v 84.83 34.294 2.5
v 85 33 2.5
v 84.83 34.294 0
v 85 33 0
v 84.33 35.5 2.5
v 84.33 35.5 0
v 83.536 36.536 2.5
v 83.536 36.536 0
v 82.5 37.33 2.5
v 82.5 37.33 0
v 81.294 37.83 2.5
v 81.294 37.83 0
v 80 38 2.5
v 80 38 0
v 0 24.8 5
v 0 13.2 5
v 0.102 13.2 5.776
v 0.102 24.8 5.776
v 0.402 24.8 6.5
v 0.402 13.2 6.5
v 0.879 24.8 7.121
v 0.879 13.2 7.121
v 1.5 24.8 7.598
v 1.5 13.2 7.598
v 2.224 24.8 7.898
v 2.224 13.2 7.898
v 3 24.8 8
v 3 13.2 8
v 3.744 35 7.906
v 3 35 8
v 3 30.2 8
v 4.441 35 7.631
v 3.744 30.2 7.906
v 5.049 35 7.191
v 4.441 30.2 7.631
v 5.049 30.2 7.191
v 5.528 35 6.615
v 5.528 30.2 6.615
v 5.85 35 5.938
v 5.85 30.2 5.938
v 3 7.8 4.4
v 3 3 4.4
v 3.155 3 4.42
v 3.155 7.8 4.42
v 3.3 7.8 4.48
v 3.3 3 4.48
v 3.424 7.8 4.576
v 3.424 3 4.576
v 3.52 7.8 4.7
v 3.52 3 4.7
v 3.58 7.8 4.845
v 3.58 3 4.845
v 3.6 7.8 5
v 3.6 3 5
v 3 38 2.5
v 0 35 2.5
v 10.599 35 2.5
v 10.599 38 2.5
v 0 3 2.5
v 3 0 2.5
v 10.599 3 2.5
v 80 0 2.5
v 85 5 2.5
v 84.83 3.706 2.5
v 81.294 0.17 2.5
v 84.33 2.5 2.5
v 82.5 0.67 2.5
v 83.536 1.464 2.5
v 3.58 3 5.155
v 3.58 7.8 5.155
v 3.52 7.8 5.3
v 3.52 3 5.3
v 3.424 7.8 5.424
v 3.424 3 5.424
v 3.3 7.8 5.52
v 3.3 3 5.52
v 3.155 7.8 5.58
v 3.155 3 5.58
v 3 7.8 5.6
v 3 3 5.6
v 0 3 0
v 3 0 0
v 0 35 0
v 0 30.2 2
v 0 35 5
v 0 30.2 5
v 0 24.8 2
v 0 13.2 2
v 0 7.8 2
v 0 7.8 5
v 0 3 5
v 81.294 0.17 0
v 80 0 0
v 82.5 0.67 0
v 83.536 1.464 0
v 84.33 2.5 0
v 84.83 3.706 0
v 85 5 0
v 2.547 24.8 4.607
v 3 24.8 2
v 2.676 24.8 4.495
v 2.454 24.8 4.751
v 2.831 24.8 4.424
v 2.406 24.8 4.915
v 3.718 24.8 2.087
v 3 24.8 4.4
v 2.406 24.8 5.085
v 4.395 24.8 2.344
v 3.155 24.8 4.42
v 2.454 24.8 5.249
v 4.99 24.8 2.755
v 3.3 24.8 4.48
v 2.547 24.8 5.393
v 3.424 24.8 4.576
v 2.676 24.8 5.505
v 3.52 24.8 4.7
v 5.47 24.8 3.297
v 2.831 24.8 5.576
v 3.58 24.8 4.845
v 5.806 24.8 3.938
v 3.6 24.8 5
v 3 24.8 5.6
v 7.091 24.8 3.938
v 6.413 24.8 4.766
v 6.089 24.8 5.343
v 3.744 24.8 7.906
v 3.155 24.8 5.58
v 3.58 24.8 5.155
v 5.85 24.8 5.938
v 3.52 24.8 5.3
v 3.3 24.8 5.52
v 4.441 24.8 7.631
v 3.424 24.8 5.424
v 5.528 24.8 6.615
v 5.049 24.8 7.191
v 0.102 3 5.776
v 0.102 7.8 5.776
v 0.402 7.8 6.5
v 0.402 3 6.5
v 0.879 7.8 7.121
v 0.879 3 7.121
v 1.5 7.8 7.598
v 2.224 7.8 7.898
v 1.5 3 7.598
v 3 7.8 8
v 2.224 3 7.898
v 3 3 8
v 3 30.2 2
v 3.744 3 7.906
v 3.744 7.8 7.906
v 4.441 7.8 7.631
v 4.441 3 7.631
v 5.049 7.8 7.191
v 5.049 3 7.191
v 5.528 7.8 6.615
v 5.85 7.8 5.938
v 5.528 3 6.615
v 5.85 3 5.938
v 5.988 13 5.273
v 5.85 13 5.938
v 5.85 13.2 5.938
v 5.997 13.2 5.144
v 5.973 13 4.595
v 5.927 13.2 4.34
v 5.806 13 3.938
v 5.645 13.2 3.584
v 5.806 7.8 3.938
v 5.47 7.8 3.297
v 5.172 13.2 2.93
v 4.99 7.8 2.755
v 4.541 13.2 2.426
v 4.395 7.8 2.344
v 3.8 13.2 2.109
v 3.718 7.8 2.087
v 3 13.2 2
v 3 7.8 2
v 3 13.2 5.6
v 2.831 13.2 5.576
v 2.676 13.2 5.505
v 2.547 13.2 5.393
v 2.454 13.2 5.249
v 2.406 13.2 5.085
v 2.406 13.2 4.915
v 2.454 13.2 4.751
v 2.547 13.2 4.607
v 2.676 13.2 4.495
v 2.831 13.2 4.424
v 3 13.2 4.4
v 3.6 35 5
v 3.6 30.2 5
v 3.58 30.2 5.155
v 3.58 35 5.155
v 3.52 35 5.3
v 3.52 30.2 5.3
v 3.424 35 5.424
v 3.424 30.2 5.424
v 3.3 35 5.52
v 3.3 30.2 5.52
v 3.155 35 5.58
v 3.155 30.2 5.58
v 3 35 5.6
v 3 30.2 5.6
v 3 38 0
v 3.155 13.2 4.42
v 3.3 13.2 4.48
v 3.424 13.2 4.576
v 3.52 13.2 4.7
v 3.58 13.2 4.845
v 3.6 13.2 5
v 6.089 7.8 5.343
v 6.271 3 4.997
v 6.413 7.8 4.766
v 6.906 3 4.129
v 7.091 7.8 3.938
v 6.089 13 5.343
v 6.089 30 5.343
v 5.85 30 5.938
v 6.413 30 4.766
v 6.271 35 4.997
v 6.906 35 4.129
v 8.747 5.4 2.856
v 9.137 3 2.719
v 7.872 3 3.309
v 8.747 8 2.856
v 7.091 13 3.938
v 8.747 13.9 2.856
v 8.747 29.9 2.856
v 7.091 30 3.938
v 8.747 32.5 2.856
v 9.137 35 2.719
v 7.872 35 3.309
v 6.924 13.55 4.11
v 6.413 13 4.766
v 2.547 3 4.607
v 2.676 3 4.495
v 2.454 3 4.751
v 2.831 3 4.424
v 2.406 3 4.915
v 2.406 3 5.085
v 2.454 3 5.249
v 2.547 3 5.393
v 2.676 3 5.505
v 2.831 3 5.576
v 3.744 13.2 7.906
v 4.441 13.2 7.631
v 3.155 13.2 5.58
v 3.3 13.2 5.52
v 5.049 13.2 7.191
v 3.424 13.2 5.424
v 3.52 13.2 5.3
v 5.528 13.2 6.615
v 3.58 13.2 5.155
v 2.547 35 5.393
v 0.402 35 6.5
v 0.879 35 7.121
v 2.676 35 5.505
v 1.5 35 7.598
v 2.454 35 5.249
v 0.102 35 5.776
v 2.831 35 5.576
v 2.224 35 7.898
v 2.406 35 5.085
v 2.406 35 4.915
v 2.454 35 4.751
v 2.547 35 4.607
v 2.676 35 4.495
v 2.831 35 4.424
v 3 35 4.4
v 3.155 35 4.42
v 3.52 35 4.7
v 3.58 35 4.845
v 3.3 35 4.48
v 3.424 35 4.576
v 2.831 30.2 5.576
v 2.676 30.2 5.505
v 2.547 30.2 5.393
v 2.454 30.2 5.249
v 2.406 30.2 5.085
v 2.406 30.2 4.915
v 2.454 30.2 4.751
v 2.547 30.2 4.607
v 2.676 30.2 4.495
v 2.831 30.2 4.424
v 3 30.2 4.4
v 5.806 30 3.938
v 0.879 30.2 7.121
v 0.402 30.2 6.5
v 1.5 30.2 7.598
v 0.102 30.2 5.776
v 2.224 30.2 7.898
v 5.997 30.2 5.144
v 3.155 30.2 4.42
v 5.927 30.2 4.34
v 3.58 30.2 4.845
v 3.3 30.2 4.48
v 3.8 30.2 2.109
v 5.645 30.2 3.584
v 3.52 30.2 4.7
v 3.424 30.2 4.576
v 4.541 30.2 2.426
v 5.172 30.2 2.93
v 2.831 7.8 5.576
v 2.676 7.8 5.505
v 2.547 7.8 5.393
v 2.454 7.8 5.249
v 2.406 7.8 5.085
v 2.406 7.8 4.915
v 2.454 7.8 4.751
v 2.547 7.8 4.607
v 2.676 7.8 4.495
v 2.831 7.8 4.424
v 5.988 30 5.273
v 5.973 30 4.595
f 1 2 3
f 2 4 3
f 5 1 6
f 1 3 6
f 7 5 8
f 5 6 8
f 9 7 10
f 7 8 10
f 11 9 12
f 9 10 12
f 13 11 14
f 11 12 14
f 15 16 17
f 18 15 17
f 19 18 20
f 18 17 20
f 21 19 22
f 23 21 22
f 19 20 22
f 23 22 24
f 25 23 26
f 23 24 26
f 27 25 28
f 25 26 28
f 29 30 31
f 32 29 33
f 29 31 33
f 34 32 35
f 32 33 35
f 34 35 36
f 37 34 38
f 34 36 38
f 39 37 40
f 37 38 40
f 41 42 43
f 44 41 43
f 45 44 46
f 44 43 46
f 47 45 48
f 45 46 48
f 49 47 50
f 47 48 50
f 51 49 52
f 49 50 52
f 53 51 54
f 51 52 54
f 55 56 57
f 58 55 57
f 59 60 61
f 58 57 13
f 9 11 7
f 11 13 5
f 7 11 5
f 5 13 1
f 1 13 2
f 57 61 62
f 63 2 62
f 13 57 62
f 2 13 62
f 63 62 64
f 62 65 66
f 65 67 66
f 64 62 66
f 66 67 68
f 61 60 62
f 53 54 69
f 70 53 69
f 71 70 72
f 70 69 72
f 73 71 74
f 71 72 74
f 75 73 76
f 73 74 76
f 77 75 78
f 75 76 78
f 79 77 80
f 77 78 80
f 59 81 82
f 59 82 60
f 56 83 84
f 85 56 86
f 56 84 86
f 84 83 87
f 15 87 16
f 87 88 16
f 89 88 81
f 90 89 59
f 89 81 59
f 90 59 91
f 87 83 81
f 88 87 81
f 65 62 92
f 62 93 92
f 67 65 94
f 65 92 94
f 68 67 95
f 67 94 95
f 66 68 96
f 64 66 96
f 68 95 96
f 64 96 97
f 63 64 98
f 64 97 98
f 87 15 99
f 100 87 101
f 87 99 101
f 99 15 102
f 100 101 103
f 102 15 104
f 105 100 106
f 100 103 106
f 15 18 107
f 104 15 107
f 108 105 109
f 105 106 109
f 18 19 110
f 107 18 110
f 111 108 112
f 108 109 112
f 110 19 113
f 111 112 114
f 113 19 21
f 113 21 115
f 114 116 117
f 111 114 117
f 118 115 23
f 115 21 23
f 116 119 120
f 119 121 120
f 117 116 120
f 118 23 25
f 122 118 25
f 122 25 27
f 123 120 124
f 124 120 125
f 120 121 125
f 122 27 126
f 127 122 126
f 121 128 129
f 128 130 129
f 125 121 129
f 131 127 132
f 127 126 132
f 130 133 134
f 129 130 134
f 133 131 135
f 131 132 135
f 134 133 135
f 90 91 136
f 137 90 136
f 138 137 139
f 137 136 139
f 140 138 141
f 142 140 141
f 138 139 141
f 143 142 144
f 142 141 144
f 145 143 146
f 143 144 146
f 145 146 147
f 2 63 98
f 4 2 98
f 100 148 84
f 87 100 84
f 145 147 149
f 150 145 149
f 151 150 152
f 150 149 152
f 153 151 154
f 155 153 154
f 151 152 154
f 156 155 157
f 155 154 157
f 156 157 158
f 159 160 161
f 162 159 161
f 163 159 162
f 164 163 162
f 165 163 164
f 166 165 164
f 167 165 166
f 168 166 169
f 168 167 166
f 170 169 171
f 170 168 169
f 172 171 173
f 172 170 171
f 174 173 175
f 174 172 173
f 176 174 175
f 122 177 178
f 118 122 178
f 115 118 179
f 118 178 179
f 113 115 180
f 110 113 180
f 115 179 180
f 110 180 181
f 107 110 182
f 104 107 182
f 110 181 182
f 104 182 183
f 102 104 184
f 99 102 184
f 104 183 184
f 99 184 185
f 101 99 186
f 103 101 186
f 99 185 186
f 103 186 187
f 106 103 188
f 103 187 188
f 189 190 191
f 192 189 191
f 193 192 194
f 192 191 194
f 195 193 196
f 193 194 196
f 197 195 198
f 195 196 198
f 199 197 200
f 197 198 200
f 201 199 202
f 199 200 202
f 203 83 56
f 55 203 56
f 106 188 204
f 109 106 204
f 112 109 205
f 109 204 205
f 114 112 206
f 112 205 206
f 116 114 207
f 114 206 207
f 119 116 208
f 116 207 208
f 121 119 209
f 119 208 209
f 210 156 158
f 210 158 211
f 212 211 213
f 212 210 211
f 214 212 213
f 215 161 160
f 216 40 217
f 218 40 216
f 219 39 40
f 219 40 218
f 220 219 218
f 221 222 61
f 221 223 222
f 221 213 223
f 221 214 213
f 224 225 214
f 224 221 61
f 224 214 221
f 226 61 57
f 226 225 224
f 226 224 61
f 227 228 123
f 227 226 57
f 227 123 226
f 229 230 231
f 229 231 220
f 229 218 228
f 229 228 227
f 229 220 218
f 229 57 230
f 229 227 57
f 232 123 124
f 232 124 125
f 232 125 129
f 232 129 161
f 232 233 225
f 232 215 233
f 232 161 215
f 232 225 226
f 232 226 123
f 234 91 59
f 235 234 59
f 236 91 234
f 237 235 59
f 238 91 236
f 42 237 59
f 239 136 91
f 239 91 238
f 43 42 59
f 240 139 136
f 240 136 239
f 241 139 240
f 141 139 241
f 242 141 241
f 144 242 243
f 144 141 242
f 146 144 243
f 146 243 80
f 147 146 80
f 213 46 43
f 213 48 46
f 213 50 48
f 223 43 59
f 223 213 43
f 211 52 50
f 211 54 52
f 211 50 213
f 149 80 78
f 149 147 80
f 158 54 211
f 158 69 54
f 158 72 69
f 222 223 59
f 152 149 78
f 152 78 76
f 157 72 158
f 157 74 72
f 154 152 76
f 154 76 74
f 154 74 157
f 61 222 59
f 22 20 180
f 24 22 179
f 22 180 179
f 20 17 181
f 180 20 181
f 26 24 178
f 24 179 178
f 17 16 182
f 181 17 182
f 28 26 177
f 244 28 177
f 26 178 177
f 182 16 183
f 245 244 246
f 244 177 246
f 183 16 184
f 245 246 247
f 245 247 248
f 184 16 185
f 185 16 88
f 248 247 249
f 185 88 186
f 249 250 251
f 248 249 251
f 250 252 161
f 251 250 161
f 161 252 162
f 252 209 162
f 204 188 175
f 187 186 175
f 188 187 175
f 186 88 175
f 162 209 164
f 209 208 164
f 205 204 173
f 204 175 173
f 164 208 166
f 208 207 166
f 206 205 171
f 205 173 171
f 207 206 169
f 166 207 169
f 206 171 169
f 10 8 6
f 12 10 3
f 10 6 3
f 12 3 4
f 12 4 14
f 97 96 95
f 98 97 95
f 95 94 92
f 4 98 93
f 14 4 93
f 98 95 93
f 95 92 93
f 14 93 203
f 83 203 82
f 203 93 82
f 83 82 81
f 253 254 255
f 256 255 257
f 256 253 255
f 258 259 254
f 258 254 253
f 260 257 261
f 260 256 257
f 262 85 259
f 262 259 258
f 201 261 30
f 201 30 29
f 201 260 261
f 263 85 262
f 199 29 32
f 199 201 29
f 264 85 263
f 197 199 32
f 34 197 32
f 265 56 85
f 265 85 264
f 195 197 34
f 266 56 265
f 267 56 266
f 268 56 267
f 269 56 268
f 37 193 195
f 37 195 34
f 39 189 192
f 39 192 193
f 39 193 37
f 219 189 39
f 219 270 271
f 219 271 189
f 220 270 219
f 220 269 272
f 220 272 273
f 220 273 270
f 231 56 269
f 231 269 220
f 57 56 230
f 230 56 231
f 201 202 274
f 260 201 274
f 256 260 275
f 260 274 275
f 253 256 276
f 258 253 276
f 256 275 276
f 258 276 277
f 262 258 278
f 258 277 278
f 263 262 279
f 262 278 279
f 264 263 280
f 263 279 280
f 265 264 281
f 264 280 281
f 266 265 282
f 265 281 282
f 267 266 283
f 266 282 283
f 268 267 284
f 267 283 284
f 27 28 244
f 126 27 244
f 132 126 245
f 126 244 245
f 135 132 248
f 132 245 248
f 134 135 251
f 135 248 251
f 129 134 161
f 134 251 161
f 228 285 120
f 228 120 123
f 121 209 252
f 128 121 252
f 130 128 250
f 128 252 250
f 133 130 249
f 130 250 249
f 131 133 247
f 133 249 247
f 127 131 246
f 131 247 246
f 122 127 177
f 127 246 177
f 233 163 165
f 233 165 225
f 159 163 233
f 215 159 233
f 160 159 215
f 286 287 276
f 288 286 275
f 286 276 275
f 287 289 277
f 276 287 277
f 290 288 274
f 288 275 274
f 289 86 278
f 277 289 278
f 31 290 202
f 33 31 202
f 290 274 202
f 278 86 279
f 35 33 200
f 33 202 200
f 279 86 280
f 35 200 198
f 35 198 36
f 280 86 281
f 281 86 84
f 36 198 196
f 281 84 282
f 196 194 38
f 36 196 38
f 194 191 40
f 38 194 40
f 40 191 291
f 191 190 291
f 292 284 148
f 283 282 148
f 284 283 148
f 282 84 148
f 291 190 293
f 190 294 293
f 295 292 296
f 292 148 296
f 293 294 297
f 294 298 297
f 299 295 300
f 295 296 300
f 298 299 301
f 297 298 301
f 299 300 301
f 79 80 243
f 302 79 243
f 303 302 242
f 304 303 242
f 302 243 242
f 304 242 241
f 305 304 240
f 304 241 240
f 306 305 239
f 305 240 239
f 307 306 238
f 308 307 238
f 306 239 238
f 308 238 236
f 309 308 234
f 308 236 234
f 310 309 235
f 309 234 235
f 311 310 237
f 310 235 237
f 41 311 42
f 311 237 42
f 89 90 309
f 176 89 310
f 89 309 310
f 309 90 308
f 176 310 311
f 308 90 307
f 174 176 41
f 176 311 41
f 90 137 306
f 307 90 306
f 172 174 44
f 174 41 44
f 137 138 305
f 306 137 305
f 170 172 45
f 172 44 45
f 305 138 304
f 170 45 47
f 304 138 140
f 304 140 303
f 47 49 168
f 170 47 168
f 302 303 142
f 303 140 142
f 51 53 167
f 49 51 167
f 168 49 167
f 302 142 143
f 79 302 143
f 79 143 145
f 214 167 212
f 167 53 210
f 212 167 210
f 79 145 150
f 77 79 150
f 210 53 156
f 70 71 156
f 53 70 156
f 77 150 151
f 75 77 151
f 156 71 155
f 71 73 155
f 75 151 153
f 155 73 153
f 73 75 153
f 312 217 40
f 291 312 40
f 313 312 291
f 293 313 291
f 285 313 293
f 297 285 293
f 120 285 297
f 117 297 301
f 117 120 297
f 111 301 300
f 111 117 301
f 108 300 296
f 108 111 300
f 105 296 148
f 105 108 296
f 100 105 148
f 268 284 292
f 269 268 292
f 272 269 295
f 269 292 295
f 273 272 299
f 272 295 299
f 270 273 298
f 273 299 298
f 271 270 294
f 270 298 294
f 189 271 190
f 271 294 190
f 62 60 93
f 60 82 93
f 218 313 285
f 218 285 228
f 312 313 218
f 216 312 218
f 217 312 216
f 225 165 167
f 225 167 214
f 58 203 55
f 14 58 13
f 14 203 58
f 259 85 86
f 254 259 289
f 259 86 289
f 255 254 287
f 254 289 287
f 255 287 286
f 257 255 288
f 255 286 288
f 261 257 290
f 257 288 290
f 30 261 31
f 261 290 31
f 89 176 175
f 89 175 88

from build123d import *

# Parameters (mm, degrees)
BOSS_EXTRUDE1_DEPTH     = 38
FILLET1_R               = 5
CUT_EXTRUDE2_DEPTH      = 2.7
CUT_EXTRUDE2_DEPTH_BACK = 2.7
SKETCH4_R               = 3
CUT_EXTRUDE3_DEPTH      = 2.7
CUT_EXTRUDE3_DEPTH_BACK = 2.7
SKETCH5_R               = 3
SKETCH6_W               = 15.806991546
SKETCH6_H               = 7.262468959
CUT_EXTRUDE4_DEPTH      = 3
SKETCH7_W               = 28.198471628
SKETCH7_H               = 7.72700603
CUT_EXTRUDE5_DEPTH      = 3
CHAMFER1_SIZE           = 3
FILLET2_R               = 5
SKETCH8_W               = 6.878152115
SKETCH8_H               = 5.2
SKETCH8_W_2             = 6.400502662
CUT_EXTRUDE6_DEPTH      = 2


with BuildPart() as part:
    # Sketch1 → Boss-Extrude1 (new body)
    with BuildSketch(Plane(origin=(0, 0, 0), x_dir=(1, 0, 0), z_dir=(0, 1, 0))):
        with BuildLine():
            Line((85, 0), (3, 0))
            Line((3, 0), (3, -2))
            ThreePointArc((3, -2), (3.866025404, -2.127718677), (4.658312395, -2.5))
            Line((4.658312395, -2.5), (85, -2.5))
            Line((85, -2.5), (85, 0))
        make_face()
        with BuildLine():
            Line((3, -2), (3, 0))
            Line((3, 0), (0, 0))
            Line((0, 0), (0, -2.5))
            Line((0, -2.5), (1.341687605, -2.5))
            ThreePointArc((1.341687605, -2.5), (2.133974596, -2.127718677), (3, -2))
        make_face()
        with BuildLine():
            ThreePointArc((0, -5), (0.356617963, -3.581362835), (1.341687605, -2.5))
            Line((1.341687605, -2.5), (0, -2.5))
            Line((0, -2.5), (0, -5))
        make_face()
        with BuildLine():
            Line((3, -4.4), (3, -2.5))
            Line((3, -2.5), (0, -5))
            ThreePointArc((0, -5), (0.878679656, -7.121320344), (3, -8))
            Line((3, -8), (3, -5.6))
            ThreePointArc((3, -5.6), (2.4, -5), (3, -4.4))
        make_face()
        with BuildLine():
            Line((4.658312395, -2.5), (3, -2.5))
            Line((3, -2.5), (3, -4.4))
            ThreePointArc((3, -4.4), (3.424264069, -4.575735931), (3.6, -5))
            ThreePointArc((3.6, -5), (3.424264069, -5.424264069), (3, -5.6))
            Line((3, -5.6), (3, -8))
            ThreePointArc((3, -8), (5.121320344, -7.121320344), (6, -5))
            ThreePointArc((6, -5), (5.643382037, -3.581362835), (4.658312395, -2.5))
        make_face()
        with BuildLine():
            Line((0, -5), (3, -2.5))
            Line((3, -2.5), (1.341687605, -2.5))
            ThreePointArc((1.341687605, -2.5), (0.356617963, -3.581362835), (0, -5))
        make_face()
        with BuildLine():
            Line((3, -2.5), (3, -2))
            ThreePointArc((3, -2), (2.133974596, -2.127718677), (1.341687605, -2.5))
            Line((1.341687605, -2.5), (3, -2.5))
        make_face()
        with BuildLine():
            ThreePointArc((4.658312395, -2.5), (3.866025404, -2.127718677), (3, -2))
            Line((3, -2), (3, -2.5))
            Line((3, -2.5), (4.658312395, -2.5))
        make_face()
    extrude(amount=BOSS_EXTRUDE1_DEPTH)

    # Fillet1
    fillet1_edges = [part.edges().sort_by_distance(p)[0] for p in [
        (4.658312395, 19, 2.5),
    ]]
    fillet(fillet1_edges, radius=FILLET1_R)

    # Sketch4 → Cut-Extrude2 (cut, two sides: drawn at the far end of the back side and taken through both)
    with BuildSketch(Plane(origin=(0, 27.5, 0), x_dir=(1, 0, 0), z_dir=(0, 1, 0)).offset(-CUT_EXTRUDE2_DEPTH_BACK)):
        with Locations((3, -5)):
            Circle(SKETCH4_R)
        with BuildLine():
            ThreePointArc((0, -5), (0.878679656, -2.878679656), (3, -2))
            Line((3, -2), (0, -2))
            Line((0, -2), (0, -5))
        make_face()
    extrude(amount=CUT_EXTRUDE2_DEPTH + CUT_EXTRUDE2_DEPTH_BACK, mode=Mode.SUBTRACT)

    # Sketch5 → Cut-Extrude3 (cut, two sides: drawn at the far end of the back side and taken through both)
    with BuildSketch(Plane(origin=(0, 10.5, 0), x_dir=(1, 0, 0), z_dir=(0, 1, 0)).offset(-CUT_EXTRUDE3_DEPTH_BACK)):
        with Locations((3, -5)):
            Circle(SKETCH5_R)
        with BuildLine():
            ThreePointArc((0, -5), (0.878679656, -2.878679656), (3, -2))
            Line((3, -2), (0, -2))
            Line((0, -2), (0, -5))
        make_face()
    extrude(amount=CUT_EXTRUDE3_DEPTH + CUT_EXTRUDE3_DEPTH_BACK, mode=Mode.SUBTRACT)

    # Sketch6 → Cut-Extrude4 (cut)
    with BuildSketch(Plane(origin=(0, 38, 0), x_dir=(1, 0, 0), z_dir=(0, 1, 0))):
        with Locations((5.822770624, -6.13123448)):
            Rectangle(SKETCH6_W, SKETCH6_H)
    extrude(amount=-CUT_EXTRUDE4_DEPTH, mode=Mode.SUBTRACT)

    # Sketch7 → Cut-Extrude5 (cut)
    with BuildSketch(Plane.XZ):
        with Locations((11.372216332, 6.363503015)):
            Rectangle(SKETCH7_W, SKETCH7_H)
    extrude(amount=-CUT_EXTRUDE5_DEPTH, mode=Mode.SUBTRACT)

    # Chamfer1
    chamfer1_edges = [part.edges().sort_by_distance(p)[0] for p in [
        (0, 38, 1.25),
        (0, 0, 1.25),
    ]]
    chamfer(chamfer1_edges, length=CHAMFER1_SIZE)

    # Fillet2
    fillet2_edges = [part.edges().sort_by_distance(p)[0] for p in [
        (85, 38, 1.25),
        (85, 0, 1.25),
    ]]
    fillet(fillet2_edges, radius=FILLET2_R)

    # Sketch8 → Cut-Extrude6 (cut)
    with BuildSketch(Plane.XY.offset(5.9375)):
        with Locations((6.922338589, 10.4)):
            Rectangle(SKETCH8_W, SKETCH8_H)
        with Locations((6.683513862, 27.4)):
            Rectangle(SKETCH8_W_2, SKETCH8_H)
    extrude(amount=-CUT_EXTRUDE6_DEPTH, mode=Mode.SUBTRACT)


solid = part.part
